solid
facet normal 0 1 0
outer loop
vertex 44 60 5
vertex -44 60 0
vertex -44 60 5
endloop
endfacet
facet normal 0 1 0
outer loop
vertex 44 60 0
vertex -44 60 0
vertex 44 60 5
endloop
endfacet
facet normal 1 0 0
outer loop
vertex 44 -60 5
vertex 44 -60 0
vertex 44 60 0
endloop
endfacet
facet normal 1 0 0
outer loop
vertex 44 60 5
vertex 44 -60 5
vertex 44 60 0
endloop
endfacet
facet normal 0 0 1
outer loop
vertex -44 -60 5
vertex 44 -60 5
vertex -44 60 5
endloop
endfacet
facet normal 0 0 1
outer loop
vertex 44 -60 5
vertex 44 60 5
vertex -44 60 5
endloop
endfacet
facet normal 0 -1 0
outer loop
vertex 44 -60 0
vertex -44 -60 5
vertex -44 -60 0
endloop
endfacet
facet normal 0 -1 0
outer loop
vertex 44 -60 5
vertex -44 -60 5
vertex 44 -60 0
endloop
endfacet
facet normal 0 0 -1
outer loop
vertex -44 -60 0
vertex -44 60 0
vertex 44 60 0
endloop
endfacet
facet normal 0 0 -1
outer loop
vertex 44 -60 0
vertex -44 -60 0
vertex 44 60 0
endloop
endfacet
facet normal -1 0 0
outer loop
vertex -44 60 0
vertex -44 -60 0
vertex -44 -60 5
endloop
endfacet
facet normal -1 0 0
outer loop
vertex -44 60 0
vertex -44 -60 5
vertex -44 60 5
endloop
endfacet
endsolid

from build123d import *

# Parameters (mm, degrees)
F0_W     = 88
F0_H     = 120
F1_DEPTH = 5
F3_DEPTH = 117
F5_DEPTH = 117


with BuildPart() as f1:
    # F0 (on Top) → F1 (new body)
    with BuildSketch(Plane.XY):
        Rectangle(F0_W, F0_H)
    extrude(amount=F1_DEPTH)

    # F2 (on face) → F3 (cut)
    with BuildSketch(Plane.XZ.offset(60)):
        Polygon((41.267949, 5), (-41.267949, 5), (-43, 2), (43, 2), align=None)
    extrude(amount=-F3_DEPTH, mode=Mode.SUBTRACT)

    # F4 (on face) → F5 (join)
    with BuildSketch(Plane.XZ.offset(-57)):
        Polygon((41.267949, 5), (-41.267949, 5), (-43, 2), (43, 2), align=None)
    extrude(amount=F5_DEPTH)


solid = f1.part
